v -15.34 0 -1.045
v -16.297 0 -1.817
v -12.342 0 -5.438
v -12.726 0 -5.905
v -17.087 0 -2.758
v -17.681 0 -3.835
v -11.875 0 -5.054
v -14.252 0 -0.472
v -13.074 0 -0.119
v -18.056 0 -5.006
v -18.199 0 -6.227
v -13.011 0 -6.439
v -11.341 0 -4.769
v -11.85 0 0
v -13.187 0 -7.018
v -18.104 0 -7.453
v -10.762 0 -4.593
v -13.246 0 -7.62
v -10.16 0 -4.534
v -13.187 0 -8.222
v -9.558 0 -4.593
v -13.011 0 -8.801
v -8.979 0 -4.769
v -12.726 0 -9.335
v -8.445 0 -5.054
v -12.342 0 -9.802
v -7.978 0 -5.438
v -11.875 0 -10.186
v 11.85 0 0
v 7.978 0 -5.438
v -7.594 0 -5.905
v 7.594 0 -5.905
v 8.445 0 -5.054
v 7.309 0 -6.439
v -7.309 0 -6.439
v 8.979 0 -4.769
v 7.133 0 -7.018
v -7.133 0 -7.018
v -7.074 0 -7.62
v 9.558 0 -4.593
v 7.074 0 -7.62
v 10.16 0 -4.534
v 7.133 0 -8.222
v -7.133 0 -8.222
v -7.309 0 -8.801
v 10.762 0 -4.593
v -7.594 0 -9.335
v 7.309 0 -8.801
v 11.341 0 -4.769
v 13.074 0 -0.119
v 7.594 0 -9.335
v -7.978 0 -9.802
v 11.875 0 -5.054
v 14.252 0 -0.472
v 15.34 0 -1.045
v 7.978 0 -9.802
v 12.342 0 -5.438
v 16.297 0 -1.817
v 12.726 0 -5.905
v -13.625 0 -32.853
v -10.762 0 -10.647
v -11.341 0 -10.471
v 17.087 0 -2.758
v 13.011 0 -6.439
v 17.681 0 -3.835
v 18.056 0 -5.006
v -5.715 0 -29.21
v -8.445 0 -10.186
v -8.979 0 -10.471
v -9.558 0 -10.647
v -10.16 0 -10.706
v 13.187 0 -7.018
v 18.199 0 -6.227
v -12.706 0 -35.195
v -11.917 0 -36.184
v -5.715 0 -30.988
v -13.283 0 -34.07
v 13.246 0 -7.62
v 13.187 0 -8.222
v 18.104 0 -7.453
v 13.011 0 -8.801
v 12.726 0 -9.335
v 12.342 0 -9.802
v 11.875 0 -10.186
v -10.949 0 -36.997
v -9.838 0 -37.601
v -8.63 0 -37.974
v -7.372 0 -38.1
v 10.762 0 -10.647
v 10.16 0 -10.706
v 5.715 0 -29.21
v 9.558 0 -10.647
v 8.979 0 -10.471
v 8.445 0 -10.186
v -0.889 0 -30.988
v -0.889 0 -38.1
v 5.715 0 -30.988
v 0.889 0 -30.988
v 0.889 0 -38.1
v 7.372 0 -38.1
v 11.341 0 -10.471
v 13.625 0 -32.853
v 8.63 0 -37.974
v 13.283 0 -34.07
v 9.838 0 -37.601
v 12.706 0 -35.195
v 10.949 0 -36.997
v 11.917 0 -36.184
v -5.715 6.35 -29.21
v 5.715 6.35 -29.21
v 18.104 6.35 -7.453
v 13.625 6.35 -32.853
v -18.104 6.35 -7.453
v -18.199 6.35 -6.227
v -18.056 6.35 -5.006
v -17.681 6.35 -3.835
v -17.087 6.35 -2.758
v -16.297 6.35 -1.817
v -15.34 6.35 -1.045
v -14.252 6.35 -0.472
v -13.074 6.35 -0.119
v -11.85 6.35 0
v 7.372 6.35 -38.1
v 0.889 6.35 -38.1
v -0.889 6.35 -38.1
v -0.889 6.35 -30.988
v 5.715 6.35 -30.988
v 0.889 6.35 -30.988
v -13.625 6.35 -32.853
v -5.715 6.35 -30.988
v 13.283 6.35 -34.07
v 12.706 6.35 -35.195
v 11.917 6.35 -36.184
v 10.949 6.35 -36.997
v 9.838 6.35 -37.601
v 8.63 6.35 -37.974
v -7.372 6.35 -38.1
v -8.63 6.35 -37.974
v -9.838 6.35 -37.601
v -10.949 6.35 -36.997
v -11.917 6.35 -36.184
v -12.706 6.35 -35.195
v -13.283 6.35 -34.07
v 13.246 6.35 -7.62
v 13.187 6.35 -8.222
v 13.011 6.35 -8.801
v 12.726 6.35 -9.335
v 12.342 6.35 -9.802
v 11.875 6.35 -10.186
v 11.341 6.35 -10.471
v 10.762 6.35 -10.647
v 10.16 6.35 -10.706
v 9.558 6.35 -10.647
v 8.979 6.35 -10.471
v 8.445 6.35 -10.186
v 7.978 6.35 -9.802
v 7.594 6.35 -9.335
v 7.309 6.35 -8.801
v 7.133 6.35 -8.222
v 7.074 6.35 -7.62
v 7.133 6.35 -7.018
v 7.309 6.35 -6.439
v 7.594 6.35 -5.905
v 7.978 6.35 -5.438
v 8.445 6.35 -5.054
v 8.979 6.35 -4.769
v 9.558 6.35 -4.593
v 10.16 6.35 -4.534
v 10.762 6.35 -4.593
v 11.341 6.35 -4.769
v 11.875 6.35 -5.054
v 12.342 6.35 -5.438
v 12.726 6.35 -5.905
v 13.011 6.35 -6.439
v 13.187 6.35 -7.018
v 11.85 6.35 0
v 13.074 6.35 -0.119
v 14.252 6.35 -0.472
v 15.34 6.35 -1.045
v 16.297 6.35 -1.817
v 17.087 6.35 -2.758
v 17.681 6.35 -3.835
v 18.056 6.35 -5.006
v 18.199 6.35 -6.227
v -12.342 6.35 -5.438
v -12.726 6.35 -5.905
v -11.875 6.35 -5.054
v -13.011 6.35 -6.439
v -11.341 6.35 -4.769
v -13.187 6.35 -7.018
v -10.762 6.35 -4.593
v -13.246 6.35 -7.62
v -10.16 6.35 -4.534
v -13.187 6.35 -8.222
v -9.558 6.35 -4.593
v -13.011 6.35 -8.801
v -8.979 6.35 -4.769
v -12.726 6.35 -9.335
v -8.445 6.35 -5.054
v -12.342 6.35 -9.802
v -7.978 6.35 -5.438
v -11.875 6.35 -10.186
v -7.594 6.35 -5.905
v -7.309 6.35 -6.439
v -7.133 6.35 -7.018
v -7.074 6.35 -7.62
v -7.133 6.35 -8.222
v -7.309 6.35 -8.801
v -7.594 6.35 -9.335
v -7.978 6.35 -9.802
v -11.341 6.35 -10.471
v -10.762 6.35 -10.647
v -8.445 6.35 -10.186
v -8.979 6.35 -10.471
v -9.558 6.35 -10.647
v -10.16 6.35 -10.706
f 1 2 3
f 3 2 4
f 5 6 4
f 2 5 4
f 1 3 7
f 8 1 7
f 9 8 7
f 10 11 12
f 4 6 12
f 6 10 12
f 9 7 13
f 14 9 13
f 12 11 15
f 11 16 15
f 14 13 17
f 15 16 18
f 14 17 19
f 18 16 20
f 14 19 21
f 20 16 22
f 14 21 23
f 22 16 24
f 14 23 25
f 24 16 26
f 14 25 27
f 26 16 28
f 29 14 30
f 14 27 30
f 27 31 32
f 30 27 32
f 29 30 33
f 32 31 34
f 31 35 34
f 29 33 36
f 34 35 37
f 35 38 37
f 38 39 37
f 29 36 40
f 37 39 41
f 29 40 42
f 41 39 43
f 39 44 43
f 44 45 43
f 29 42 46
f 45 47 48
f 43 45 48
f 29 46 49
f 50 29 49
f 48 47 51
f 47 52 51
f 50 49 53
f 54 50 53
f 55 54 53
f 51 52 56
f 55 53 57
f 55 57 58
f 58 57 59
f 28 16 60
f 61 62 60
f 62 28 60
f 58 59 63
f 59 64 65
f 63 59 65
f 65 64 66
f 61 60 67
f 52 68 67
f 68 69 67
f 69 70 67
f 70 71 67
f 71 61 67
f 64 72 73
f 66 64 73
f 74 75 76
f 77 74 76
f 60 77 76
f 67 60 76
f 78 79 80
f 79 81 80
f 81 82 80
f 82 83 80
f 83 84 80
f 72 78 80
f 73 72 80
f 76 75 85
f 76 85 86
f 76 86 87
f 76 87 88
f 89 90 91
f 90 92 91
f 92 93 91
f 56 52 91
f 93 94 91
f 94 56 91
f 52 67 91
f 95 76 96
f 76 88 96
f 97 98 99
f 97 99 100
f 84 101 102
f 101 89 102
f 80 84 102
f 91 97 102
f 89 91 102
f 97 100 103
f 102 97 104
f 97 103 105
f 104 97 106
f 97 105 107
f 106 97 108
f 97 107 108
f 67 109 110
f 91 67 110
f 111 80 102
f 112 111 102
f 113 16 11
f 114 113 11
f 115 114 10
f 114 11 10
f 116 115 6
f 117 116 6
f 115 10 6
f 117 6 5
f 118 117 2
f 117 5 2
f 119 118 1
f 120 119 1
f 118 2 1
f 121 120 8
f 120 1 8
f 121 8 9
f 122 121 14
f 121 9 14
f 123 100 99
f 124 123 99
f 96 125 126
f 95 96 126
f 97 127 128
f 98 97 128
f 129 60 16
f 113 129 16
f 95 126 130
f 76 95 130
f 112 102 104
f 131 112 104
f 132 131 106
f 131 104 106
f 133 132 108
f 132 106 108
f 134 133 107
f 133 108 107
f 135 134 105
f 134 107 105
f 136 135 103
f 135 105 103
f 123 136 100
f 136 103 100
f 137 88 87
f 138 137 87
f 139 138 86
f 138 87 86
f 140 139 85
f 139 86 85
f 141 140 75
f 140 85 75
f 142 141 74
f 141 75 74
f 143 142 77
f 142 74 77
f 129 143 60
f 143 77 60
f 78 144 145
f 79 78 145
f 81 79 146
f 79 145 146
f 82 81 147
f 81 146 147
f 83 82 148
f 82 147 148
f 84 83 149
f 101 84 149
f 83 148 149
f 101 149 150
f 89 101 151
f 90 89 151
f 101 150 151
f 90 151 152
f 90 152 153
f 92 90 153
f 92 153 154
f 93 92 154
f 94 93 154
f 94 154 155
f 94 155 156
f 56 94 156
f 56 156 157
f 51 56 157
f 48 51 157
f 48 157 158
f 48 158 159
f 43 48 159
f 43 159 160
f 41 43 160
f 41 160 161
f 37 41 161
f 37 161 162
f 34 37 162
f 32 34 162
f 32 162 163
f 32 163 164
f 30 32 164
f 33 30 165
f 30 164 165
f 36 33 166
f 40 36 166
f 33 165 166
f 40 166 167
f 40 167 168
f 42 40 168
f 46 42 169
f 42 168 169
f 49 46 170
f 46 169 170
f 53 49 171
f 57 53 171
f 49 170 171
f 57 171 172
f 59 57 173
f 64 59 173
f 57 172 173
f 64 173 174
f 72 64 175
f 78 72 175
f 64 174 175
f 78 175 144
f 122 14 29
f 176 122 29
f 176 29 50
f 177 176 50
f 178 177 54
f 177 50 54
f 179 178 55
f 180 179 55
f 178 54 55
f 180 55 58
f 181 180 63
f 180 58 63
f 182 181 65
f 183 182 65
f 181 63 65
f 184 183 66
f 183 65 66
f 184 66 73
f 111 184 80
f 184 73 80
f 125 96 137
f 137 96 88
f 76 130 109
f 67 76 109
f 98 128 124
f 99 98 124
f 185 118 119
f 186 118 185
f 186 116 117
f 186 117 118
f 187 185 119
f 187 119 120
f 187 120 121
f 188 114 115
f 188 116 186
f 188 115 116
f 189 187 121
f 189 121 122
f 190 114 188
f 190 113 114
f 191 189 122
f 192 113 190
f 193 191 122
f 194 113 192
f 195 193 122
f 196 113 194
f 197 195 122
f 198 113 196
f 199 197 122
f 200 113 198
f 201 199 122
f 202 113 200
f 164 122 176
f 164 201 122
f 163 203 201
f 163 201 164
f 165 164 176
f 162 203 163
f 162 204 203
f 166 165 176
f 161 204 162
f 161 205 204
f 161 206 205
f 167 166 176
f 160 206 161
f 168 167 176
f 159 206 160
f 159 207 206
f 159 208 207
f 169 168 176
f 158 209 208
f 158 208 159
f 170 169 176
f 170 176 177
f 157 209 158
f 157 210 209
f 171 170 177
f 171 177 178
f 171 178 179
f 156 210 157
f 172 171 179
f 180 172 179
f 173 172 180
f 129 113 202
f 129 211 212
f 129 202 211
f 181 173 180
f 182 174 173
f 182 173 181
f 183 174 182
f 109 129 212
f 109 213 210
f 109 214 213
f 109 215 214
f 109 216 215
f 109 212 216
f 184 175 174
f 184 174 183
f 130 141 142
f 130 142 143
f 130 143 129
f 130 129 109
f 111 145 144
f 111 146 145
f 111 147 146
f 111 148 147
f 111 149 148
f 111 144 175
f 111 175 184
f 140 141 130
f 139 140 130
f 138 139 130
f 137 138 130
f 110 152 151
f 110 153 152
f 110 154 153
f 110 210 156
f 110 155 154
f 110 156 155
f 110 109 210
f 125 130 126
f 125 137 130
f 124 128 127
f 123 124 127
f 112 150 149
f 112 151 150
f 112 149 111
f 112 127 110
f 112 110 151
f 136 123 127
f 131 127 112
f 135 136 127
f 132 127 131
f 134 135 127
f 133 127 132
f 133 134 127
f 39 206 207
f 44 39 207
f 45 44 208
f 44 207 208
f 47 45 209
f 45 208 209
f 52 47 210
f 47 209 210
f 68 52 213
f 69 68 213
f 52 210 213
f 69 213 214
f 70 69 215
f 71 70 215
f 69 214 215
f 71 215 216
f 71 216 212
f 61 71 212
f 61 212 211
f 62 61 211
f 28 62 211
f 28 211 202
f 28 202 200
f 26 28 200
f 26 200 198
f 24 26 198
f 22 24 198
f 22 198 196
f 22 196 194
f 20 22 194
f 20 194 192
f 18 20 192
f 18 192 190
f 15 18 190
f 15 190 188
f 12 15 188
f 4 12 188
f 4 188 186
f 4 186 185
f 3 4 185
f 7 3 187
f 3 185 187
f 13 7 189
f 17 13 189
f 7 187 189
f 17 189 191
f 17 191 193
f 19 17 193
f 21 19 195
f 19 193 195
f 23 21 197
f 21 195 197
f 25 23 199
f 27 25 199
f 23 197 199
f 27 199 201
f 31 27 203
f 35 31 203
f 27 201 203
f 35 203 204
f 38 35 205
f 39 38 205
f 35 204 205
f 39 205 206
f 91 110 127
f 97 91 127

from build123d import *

# Parameters (mm, degrees)
BOSS_EXTRUDE1_DEPTH = 6.35
SKETCH2_R           = 3.0861
CUT_EXTRUDE1_DEPTH  = 7.35
CUT_EXTRUDE2_DEPTH  = 7.35


with BuildPart() as part:
    # Sketch1 → Boss-Extrude1 (new body)
    with BuildSketch(Plane(origin=(0, 0, 0), x_dir=(1, 0, 0), z_dir=(0, 1, 0))):
        with BuildLine():
            Line((-11.850422652, 0), (11.850422652, 0))
            ThreePointArc((11.850422652, 0), (16.714804866, 2.268298678), (18.103951884, 7.452665928))
            Line((18.103951884, 7.452665928), (13.625246574, 32.852665928))
            ThreePointArc((13.625246574, 32.852665928), (11.453418664, 36.614382214), (7.371717342, 38.1))
            Line((7.371717342, 38.1), (-7.371717342, 38.1))
            ThreePointArc((-7.371717342, 38.1), (-11.453418664, 36.614382214), (-13.625246574, 32.852665928))
            Line((-13.625246574, 32.852665928), (-18.103951884, 7.452665928))
            ThreePointArc((-18.103951884, 7.452665928), (-16.714804866, 2.268298678), (-11.850422652, 0))
        make_face()
    extrude(amount=BOSS_EXTRUDE1_DEPTH)

    # Sketch2 → Cut-Extrude1 (cut, through all)
    with BuildSketch(Plane(origin=(0, 6.35, 0), x_dir=(1, 0, 0), z_dir=(0, 1, 0))):
        with Locations((-10.16, 7.62)):
            Circle(SKETCH2_R)
        with Locations((10.16, 7.62)):
            Circle(SKETCH2_R)
    extrude(amount=-CUT_EXTRUDE1_DEPTH, mode=Mode.SUBTRACT)

    # Sketch3 → Cut-Extrude2 (cut, through all)
    with BuildSketch(Plane(origin=(0, 6.35, 0), x_dir=(1, 0, 0), z_dir=(0, 1, 0))):
        Polygon((-0.889, 38.1), (-0.889, 30.988), (-5.715, 30.988), (-5.715, 29.21), (5.715, 29.21), (5.715, 30.988), (0.889, 30.988), (0.889, 38.1), align=None)
    extrude(amount=-CUT_EXTRUDE2_DEPTH, mode=Mode.SUBTRACT)


solid = part.part
